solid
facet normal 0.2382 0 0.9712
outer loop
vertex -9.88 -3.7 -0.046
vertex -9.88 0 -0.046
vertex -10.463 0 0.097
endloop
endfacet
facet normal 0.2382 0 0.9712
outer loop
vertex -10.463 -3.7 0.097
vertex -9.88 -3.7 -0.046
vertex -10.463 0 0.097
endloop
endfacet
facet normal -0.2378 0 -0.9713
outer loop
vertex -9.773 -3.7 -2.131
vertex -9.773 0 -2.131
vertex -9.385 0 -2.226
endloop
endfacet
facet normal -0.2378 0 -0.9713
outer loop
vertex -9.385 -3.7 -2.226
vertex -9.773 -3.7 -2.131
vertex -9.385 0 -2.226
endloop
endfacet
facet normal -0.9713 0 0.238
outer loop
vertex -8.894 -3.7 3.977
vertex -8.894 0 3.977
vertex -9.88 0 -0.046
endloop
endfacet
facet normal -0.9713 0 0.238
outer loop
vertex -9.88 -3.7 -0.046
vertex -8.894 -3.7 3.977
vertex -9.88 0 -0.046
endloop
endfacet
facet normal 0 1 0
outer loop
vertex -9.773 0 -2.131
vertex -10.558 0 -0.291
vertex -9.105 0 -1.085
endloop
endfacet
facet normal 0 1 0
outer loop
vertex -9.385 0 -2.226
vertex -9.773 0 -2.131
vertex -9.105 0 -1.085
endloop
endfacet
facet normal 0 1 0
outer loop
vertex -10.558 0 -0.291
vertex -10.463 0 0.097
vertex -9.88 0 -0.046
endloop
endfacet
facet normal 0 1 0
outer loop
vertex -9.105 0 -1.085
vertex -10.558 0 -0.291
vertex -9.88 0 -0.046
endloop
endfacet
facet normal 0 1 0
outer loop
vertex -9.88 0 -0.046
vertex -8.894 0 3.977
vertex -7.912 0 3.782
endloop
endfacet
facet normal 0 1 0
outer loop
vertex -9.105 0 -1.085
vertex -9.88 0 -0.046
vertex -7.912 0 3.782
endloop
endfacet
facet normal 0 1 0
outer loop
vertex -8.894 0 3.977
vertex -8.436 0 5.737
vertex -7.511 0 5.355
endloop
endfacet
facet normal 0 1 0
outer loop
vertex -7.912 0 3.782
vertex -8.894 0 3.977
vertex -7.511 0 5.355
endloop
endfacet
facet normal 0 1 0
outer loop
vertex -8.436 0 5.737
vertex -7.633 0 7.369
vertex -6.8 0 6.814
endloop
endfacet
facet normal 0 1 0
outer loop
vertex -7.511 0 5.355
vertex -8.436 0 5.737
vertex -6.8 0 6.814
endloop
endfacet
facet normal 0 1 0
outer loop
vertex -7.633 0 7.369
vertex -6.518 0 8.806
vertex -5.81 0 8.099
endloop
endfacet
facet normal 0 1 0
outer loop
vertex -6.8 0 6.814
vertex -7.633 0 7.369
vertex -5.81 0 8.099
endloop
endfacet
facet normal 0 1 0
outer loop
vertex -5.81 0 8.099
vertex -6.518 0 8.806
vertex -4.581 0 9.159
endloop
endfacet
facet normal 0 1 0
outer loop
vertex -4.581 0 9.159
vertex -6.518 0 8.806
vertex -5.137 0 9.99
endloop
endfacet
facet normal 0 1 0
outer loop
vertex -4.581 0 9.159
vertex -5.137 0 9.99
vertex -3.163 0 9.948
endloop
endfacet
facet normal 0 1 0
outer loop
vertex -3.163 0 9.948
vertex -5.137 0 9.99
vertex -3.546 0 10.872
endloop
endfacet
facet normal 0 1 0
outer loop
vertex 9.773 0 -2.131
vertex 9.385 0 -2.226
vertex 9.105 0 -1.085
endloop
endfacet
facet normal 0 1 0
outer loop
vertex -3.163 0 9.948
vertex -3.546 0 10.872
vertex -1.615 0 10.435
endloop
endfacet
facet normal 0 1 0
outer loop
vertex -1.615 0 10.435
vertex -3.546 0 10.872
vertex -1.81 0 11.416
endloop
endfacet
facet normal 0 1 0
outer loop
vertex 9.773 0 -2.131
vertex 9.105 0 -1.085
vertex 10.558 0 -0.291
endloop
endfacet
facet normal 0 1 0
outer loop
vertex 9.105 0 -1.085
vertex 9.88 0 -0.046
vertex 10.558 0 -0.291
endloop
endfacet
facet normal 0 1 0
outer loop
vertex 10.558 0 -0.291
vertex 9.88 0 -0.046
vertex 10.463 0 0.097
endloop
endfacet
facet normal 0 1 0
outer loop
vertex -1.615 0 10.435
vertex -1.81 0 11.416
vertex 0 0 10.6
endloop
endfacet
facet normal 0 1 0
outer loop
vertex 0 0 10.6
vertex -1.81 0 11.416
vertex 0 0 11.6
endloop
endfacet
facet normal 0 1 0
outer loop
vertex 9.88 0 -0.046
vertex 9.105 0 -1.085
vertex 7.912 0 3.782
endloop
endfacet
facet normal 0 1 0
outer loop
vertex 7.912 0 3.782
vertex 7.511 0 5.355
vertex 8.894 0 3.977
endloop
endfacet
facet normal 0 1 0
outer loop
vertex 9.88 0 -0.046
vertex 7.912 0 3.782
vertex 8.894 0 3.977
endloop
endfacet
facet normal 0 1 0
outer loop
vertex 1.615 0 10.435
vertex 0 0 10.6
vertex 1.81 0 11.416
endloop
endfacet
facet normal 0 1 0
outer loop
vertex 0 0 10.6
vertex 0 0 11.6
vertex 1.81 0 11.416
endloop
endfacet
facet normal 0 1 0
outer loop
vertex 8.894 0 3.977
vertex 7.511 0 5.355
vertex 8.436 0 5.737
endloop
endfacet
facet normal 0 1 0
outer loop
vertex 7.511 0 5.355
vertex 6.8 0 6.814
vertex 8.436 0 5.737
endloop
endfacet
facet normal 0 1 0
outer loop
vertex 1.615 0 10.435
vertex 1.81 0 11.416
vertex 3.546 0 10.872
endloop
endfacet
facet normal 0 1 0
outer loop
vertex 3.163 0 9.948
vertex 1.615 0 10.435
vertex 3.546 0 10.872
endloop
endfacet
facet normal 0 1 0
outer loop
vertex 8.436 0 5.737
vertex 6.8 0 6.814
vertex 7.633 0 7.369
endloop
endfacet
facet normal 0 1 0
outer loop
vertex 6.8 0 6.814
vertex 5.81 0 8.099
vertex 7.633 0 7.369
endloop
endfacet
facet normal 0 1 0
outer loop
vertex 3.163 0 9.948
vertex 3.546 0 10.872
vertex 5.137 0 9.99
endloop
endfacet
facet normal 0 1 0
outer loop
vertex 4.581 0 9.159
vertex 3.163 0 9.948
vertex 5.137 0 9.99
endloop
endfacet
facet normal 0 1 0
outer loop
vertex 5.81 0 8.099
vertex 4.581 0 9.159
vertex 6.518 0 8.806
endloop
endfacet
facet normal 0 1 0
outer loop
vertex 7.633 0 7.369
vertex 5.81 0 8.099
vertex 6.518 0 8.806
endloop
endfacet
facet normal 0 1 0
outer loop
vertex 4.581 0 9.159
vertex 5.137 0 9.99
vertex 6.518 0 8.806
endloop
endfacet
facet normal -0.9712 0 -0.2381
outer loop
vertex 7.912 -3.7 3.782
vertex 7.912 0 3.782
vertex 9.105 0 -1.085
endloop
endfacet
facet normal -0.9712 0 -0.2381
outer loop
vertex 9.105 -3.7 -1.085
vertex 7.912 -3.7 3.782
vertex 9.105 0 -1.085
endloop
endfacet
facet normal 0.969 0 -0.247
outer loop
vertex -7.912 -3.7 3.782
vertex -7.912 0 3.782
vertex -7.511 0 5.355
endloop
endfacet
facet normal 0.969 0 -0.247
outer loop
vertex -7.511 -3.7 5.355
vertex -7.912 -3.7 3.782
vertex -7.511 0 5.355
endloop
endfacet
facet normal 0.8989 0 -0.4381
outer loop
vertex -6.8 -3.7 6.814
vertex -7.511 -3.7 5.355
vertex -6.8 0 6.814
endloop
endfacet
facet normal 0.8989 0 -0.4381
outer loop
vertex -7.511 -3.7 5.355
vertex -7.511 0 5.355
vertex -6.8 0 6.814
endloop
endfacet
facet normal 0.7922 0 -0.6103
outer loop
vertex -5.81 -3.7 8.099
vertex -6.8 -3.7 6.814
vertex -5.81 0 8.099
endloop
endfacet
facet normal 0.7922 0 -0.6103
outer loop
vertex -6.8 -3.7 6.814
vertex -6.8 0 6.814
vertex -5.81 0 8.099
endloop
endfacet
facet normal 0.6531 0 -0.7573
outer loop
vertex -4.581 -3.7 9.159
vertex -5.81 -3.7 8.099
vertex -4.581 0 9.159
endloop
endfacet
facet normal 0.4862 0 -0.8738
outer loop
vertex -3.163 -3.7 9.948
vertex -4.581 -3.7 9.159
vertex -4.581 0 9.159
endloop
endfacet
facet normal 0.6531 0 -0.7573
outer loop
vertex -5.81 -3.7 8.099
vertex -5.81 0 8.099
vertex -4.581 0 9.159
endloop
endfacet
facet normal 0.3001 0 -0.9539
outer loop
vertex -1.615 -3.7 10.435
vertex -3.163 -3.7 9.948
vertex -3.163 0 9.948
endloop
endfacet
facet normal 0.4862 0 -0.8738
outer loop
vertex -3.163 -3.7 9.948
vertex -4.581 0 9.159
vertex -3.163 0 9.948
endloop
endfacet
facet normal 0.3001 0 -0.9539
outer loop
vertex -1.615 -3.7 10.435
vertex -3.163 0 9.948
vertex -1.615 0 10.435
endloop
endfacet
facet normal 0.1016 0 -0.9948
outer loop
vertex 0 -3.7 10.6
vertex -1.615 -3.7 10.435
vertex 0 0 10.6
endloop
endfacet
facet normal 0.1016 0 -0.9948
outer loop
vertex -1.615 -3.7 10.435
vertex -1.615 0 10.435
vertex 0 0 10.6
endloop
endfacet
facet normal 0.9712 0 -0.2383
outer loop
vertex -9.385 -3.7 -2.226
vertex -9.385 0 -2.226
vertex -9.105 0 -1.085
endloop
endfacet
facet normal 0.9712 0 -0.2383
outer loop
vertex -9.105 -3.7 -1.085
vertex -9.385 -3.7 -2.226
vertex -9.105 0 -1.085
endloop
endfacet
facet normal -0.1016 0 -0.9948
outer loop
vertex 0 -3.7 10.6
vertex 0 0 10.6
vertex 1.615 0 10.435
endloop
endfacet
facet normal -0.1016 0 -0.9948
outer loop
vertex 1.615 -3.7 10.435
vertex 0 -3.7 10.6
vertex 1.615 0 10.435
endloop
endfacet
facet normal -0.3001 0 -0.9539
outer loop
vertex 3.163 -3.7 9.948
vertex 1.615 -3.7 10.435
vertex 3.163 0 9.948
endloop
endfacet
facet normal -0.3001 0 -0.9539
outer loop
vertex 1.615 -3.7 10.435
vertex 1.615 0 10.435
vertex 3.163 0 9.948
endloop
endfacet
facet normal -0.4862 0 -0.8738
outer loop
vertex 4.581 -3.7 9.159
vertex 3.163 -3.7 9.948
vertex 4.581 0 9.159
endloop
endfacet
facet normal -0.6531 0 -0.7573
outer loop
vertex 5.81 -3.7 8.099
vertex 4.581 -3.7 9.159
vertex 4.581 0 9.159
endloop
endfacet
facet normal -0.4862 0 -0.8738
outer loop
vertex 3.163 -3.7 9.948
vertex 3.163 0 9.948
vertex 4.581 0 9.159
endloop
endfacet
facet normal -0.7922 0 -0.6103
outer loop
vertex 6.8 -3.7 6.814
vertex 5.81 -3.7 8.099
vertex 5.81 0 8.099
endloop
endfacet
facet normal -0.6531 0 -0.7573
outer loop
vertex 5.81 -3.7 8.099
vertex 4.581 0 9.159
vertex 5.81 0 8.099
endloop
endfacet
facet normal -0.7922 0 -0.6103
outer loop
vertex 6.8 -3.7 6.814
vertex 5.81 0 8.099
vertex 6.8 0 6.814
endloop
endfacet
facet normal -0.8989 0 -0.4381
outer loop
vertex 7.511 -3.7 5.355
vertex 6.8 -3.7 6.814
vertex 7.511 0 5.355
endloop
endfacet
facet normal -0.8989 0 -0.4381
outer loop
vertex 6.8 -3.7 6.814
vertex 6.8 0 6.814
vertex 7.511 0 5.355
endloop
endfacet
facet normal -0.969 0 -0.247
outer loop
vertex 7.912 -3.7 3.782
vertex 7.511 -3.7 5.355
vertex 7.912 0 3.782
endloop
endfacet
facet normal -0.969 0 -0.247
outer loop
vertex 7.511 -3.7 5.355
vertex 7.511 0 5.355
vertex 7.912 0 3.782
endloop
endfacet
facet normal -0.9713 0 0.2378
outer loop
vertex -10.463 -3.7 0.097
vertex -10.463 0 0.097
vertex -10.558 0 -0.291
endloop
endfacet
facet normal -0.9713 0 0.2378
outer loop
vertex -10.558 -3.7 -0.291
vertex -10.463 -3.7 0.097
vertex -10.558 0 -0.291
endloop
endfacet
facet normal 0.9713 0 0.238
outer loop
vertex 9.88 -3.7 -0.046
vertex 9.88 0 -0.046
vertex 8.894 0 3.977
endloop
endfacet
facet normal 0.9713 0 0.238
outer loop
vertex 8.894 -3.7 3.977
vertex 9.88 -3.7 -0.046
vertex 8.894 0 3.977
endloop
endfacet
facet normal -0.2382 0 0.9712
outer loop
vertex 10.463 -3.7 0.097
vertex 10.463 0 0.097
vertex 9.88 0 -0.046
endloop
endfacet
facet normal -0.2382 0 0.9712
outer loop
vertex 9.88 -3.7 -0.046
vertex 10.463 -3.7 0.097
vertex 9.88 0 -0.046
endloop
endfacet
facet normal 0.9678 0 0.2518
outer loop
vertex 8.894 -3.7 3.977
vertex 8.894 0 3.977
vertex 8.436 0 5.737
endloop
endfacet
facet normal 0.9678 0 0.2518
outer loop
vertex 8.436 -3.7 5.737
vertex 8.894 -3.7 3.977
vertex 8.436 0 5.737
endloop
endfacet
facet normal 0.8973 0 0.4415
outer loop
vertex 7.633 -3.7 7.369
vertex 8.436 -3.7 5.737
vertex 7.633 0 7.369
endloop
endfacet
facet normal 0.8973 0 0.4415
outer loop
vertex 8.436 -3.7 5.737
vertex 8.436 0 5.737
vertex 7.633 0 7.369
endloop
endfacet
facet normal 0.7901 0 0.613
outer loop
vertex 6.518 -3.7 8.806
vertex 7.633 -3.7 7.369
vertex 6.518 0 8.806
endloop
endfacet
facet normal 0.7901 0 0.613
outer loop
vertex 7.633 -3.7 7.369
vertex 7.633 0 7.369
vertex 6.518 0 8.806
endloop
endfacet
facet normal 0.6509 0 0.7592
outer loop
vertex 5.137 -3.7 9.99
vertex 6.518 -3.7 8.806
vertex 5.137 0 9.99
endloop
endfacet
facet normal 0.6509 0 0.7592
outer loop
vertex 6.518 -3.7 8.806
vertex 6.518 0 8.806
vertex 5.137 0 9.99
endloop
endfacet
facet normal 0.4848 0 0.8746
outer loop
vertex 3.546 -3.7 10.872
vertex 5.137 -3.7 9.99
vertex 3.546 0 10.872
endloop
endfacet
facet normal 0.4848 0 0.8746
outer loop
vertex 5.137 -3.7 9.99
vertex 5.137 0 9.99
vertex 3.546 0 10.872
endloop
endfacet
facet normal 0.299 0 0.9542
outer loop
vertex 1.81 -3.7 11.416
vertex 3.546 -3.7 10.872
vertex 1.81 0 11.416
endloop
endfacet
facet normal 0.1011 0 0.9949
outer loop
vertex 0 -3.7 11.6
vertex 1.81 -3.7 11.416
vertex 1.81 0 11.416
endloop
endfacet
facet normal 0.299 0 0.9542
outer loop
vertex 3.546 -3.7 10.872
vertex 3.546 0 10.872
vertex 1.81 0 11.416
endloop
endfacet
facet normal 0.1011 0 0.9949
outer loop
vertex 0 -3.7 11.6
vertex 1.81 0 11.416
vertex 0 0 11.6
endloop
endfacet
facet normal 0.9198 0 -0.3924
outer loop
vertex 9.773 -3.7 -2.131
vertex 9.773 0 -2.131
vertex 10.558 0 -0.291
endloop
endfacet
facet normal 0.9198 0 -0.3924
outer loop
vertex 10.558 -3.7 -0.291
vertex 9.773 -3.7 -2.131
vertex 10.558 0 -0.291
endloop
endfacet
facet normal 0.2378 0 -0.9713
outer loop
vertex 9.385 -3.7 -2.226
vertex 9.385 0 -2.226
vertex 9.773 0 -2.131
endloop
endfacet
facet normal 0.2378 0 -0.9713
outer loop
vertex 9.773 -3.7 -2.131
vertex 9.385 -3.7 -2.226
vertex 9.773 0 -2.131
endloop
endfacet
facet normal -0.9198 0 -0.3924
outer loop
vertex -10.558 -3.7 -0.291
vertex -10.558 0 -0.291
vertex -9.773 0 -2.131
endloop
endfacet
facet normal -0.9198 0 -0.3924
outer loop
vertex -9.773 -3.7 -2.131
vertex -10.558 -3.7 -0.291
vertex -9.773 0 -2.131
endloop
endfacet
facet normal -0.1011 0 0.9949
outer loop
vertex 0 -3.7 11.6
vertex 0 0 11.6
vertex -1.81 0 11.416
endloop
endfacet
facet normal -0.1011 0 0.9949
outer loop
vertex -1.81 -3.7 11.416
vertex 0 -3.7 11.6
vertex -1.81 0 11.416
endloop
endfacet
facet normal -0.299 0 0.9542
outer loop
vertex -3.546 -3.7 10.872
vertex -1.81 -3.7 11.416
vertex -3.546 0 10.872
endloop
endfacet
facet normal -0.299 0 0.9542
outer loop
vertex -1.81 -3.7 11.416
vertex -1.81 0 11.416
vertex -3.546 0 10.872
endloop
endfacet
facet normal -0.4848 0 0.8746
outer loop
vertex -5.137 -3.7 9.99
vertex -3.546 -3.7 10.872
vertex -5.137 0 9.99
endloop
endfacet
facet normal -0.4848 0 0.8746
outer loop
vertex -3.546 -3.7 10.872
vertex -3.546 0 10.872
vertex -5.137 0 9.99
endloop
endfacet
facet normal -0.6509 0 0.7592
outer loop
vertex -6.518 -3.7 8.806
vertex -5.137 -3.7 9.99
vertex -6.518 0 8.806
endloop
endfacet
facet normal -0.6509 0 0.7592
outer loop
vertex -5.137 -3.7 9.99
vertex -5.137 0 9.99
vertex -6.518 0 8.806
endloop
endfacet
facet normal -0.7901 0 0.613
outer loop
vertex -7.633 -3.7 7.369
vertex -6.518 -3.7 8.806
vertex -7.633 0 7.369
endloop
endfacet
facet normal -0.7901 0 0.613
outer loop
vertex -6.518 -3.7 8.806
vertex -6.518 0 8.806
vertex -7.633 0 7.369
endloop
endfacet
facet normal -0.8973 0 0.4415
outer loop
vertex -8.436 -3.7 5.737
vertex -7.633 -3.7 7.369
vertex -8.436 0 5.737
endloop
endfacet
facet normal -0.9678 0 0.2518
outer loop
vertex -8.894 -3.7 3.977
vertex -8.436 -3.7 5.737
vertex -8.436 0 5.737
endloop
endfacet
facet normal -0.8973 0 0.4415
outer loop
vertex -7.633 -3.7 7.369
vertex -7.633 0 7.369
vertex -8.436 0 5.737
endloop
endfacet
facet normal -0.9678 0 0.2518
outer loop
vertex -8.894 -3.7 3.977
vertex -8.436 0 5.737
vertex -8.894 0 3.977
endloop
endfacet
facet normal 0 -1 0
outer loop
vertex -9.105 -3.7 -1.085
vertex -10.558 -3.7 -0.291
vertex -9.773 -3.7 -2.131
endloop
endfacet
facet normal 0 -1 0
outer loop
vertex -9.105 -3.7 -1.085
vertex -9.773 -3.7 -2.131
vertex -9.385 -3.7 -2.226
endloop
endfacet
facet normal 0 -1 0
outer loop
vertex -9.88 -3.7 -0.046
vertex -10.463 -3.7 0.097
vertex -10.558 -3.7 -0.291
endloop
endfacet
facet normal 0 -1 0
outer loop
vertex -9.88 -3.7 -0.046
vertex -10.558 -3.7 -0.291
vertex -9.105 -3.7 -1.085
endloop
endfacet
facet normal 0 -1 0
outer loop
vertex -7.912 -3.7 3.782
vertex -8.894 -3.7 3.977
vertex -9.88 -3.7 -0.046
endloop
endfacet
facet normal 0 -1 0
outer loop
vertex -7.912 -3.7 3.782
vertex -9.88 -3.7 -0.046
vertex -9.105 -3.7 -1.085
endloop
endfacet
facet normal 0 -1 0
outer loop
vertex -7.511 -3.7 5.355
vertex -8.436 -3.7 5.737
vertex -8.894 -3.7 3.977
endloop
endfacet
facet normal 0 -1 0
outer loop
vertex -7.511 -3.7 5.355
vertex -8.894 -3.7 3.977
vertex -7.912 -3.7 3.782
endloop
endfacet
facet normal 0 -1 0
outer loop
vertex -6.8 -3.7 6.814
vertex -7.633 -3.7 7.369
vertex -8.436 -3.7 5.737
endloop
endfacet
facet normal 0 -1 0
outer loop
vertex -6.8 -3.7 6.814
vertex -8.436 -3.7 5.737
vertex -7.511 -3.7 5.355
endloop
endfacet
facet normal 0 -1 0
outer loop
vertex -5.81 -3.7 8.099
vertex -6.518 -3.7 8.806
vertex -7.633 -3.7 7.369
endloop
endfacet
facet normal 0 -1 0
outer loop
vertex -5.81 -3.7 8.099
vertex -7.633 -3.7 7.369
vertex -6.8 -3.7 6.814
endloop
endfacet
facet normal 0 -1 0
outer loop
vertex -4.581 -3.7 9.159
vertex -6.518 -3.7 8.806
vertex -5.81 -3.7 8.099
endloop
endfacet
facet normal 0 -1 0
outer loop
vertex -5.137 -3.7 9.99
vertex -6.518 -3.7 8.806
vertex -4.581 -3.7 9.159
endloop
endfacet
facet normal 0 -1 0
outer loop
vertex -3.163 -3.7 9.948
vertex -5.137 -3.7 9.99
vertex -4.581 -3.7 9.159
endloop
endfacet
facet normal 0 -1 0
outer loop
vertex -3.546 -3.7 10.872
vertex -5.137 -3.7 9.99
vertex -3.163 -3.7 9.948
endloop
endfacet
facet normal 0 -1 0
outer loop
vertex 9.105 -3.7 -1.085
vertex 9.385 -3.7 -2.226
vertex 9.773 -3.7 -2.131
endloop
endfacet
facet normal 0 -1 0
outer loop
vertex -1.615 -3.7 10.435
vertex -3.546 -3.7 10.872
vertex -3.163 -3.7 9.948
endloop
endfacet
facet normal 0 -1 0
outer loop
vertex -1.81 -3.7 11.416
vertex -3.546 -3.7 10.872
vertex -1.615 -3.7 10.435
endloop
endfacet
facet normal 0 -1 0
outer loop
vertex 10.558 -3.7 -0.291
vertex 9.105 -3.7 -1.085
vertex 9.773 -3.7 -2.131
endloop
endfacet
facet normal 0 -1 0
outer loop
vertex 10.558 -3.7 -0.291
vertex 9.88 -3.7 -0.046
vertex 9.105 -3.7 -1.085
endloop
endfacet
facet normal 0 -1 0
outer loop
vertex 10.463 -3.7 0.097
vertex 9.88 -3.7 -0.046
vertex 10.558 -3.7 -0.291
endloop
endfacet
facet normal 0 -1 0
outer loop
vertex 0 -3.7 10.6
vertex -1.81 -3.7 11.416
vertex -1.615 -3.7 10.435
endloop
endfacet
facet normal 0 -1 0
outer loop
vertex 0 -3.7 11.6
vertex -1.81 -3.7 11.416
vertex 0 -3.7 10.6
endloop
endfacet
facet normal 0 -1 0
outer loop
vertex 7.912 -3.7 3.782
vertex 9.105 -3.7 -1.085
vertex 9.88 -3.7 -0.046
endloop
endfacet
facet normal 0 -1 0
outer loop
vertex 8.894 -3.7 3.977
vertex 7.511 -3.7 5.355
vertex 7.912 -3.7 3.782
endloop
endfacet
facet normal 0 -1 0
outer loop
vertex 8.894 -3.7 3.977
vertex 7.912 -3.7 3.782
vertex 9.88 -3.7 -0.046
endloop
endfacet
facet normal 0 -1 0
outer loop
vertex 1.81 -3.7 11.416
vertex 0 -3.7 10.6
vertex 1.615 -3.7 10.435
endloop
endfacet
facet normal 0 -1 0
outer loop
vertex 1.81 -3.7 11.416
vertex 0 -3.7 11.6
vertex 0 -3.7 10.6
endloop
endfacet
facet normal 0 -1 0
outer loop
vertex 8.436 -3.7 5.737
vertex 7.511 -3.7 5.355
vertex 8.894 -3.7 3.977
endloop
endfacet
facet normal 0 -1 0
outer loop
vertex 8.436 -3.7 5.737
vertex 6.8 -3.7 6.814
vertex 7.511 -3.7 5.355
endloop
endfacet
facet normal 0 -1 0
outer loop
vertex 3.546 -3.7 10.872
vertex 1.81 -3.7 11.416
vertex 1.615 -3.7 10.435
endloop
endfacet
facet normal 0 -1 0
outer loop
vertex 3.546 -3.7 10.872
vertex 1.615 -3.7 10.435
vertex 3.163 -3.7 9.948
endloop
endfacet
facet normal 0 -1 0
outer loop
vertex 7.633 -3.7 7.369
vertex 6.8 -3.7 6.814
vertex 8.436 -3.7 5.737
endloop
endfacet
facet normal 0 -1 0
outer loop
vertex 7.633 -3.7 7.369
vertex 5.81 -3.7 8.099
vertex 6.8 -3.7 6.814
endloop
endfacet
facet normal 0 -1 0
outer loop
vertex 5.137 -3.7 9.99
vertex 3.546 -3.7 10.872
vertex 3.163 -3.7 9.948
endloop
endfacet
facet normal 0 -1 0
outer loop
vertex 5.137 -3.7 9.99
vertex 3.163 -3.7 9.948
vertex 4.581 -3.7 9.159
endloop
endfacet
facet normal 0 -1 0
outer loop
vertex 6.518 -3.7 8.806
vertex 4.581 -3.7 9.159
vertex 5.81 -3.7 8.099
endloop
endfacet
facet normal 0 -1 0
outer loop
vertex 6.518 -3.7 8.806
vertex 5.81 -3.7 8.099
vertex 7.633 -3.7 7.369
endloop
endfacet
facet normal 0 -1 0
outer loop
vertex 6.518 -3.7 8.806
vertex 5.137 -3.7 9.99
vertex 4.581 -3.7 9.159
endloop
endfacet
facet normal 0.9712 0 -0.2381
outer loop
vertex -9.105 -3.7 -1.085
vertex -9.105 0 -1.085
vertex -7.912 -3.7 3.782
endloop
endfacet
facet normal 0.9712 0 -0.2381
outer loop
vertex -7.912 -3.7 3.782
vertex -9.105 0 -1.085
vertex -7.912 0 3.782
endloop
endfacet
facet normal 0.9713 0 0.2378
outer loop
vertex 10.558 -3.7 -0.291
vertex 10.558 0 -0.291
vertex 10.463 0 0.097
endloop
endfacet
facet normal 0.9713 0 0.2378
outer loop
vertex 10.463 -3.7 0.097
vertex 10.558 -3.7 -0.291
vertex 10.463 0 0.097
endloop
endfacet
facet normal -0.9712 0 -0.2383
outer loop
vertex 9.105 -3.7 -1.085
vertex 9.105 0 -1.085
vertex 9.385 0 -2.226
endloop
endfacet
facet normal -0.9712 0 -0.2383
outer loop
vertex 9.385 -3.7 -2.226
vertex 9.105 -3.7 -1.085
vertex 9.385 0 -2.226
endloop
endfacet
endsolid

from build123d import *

# Parameters (mm, degrees)
F1_DEPTH = 3.7


with BuildPart() as f1:
    # F0 (on Front) → F1 (new body)
    with BuildSketch(Plane.XZ):
        with BuildLine():
            Line((0, 10.6), (0, 11.6))
            ThreePointArc((0, 11.6), (-5.857057, 9.433365), (-8.894091, 3.976641))
            Line((-8.894091, 3.976641), (-9.879779, -0.045725))
            Line((-9.879779, -0.045725), (-10.462536, 0.097081))
            Line((-10.462536, 0.097081), (-10.55774, -0.291424))
            Line((-10.55774, -0.291424), (-9.77304, -2.131056))
            Line((-9.77304, -2.131056), (-9.384535, -2.22626))
            Line((-9.384535, -2.22626), (-9.104897, -1.085122))
            Line((-9.104897, -1.085122), (-7.912193, 3.782031))
            ThreePointArc((-7.912193, 3.782031), (-5.222248, 8.660373), (0, 10.6))
        make_face()
        with BuildLine():
            ThreePointArc((8.894091, 3.976641), (5.857057, 9.433365), (0, 11.6))
            Line((0, 11.6), (0, 10.6))
            ThreePointArc((0, 10.6), (5.222248, 8.660373), (7.912193, 3.782031))
            Line((7.912193, 3.782031), (9.104897, -1.085122))
            Line((9.104897, -1.085122), (9.384535, -2.22626))
            Line((9.384535, -2.22626), (9.77304, -2.131056))
            Line((9.77304, -2.131056), (10.55774, -0.291424))
            Line((10.55774, -0.291424), (10.462536, 0.097081))
            Line((10.462536, 0.097081), (9.879779, -0.045725))
            Line((9.879779, -0.045725), (8.894091, 3.976641))
        make_face()
    extrude(amount=F1_DEPTH)


solid = f1.part
